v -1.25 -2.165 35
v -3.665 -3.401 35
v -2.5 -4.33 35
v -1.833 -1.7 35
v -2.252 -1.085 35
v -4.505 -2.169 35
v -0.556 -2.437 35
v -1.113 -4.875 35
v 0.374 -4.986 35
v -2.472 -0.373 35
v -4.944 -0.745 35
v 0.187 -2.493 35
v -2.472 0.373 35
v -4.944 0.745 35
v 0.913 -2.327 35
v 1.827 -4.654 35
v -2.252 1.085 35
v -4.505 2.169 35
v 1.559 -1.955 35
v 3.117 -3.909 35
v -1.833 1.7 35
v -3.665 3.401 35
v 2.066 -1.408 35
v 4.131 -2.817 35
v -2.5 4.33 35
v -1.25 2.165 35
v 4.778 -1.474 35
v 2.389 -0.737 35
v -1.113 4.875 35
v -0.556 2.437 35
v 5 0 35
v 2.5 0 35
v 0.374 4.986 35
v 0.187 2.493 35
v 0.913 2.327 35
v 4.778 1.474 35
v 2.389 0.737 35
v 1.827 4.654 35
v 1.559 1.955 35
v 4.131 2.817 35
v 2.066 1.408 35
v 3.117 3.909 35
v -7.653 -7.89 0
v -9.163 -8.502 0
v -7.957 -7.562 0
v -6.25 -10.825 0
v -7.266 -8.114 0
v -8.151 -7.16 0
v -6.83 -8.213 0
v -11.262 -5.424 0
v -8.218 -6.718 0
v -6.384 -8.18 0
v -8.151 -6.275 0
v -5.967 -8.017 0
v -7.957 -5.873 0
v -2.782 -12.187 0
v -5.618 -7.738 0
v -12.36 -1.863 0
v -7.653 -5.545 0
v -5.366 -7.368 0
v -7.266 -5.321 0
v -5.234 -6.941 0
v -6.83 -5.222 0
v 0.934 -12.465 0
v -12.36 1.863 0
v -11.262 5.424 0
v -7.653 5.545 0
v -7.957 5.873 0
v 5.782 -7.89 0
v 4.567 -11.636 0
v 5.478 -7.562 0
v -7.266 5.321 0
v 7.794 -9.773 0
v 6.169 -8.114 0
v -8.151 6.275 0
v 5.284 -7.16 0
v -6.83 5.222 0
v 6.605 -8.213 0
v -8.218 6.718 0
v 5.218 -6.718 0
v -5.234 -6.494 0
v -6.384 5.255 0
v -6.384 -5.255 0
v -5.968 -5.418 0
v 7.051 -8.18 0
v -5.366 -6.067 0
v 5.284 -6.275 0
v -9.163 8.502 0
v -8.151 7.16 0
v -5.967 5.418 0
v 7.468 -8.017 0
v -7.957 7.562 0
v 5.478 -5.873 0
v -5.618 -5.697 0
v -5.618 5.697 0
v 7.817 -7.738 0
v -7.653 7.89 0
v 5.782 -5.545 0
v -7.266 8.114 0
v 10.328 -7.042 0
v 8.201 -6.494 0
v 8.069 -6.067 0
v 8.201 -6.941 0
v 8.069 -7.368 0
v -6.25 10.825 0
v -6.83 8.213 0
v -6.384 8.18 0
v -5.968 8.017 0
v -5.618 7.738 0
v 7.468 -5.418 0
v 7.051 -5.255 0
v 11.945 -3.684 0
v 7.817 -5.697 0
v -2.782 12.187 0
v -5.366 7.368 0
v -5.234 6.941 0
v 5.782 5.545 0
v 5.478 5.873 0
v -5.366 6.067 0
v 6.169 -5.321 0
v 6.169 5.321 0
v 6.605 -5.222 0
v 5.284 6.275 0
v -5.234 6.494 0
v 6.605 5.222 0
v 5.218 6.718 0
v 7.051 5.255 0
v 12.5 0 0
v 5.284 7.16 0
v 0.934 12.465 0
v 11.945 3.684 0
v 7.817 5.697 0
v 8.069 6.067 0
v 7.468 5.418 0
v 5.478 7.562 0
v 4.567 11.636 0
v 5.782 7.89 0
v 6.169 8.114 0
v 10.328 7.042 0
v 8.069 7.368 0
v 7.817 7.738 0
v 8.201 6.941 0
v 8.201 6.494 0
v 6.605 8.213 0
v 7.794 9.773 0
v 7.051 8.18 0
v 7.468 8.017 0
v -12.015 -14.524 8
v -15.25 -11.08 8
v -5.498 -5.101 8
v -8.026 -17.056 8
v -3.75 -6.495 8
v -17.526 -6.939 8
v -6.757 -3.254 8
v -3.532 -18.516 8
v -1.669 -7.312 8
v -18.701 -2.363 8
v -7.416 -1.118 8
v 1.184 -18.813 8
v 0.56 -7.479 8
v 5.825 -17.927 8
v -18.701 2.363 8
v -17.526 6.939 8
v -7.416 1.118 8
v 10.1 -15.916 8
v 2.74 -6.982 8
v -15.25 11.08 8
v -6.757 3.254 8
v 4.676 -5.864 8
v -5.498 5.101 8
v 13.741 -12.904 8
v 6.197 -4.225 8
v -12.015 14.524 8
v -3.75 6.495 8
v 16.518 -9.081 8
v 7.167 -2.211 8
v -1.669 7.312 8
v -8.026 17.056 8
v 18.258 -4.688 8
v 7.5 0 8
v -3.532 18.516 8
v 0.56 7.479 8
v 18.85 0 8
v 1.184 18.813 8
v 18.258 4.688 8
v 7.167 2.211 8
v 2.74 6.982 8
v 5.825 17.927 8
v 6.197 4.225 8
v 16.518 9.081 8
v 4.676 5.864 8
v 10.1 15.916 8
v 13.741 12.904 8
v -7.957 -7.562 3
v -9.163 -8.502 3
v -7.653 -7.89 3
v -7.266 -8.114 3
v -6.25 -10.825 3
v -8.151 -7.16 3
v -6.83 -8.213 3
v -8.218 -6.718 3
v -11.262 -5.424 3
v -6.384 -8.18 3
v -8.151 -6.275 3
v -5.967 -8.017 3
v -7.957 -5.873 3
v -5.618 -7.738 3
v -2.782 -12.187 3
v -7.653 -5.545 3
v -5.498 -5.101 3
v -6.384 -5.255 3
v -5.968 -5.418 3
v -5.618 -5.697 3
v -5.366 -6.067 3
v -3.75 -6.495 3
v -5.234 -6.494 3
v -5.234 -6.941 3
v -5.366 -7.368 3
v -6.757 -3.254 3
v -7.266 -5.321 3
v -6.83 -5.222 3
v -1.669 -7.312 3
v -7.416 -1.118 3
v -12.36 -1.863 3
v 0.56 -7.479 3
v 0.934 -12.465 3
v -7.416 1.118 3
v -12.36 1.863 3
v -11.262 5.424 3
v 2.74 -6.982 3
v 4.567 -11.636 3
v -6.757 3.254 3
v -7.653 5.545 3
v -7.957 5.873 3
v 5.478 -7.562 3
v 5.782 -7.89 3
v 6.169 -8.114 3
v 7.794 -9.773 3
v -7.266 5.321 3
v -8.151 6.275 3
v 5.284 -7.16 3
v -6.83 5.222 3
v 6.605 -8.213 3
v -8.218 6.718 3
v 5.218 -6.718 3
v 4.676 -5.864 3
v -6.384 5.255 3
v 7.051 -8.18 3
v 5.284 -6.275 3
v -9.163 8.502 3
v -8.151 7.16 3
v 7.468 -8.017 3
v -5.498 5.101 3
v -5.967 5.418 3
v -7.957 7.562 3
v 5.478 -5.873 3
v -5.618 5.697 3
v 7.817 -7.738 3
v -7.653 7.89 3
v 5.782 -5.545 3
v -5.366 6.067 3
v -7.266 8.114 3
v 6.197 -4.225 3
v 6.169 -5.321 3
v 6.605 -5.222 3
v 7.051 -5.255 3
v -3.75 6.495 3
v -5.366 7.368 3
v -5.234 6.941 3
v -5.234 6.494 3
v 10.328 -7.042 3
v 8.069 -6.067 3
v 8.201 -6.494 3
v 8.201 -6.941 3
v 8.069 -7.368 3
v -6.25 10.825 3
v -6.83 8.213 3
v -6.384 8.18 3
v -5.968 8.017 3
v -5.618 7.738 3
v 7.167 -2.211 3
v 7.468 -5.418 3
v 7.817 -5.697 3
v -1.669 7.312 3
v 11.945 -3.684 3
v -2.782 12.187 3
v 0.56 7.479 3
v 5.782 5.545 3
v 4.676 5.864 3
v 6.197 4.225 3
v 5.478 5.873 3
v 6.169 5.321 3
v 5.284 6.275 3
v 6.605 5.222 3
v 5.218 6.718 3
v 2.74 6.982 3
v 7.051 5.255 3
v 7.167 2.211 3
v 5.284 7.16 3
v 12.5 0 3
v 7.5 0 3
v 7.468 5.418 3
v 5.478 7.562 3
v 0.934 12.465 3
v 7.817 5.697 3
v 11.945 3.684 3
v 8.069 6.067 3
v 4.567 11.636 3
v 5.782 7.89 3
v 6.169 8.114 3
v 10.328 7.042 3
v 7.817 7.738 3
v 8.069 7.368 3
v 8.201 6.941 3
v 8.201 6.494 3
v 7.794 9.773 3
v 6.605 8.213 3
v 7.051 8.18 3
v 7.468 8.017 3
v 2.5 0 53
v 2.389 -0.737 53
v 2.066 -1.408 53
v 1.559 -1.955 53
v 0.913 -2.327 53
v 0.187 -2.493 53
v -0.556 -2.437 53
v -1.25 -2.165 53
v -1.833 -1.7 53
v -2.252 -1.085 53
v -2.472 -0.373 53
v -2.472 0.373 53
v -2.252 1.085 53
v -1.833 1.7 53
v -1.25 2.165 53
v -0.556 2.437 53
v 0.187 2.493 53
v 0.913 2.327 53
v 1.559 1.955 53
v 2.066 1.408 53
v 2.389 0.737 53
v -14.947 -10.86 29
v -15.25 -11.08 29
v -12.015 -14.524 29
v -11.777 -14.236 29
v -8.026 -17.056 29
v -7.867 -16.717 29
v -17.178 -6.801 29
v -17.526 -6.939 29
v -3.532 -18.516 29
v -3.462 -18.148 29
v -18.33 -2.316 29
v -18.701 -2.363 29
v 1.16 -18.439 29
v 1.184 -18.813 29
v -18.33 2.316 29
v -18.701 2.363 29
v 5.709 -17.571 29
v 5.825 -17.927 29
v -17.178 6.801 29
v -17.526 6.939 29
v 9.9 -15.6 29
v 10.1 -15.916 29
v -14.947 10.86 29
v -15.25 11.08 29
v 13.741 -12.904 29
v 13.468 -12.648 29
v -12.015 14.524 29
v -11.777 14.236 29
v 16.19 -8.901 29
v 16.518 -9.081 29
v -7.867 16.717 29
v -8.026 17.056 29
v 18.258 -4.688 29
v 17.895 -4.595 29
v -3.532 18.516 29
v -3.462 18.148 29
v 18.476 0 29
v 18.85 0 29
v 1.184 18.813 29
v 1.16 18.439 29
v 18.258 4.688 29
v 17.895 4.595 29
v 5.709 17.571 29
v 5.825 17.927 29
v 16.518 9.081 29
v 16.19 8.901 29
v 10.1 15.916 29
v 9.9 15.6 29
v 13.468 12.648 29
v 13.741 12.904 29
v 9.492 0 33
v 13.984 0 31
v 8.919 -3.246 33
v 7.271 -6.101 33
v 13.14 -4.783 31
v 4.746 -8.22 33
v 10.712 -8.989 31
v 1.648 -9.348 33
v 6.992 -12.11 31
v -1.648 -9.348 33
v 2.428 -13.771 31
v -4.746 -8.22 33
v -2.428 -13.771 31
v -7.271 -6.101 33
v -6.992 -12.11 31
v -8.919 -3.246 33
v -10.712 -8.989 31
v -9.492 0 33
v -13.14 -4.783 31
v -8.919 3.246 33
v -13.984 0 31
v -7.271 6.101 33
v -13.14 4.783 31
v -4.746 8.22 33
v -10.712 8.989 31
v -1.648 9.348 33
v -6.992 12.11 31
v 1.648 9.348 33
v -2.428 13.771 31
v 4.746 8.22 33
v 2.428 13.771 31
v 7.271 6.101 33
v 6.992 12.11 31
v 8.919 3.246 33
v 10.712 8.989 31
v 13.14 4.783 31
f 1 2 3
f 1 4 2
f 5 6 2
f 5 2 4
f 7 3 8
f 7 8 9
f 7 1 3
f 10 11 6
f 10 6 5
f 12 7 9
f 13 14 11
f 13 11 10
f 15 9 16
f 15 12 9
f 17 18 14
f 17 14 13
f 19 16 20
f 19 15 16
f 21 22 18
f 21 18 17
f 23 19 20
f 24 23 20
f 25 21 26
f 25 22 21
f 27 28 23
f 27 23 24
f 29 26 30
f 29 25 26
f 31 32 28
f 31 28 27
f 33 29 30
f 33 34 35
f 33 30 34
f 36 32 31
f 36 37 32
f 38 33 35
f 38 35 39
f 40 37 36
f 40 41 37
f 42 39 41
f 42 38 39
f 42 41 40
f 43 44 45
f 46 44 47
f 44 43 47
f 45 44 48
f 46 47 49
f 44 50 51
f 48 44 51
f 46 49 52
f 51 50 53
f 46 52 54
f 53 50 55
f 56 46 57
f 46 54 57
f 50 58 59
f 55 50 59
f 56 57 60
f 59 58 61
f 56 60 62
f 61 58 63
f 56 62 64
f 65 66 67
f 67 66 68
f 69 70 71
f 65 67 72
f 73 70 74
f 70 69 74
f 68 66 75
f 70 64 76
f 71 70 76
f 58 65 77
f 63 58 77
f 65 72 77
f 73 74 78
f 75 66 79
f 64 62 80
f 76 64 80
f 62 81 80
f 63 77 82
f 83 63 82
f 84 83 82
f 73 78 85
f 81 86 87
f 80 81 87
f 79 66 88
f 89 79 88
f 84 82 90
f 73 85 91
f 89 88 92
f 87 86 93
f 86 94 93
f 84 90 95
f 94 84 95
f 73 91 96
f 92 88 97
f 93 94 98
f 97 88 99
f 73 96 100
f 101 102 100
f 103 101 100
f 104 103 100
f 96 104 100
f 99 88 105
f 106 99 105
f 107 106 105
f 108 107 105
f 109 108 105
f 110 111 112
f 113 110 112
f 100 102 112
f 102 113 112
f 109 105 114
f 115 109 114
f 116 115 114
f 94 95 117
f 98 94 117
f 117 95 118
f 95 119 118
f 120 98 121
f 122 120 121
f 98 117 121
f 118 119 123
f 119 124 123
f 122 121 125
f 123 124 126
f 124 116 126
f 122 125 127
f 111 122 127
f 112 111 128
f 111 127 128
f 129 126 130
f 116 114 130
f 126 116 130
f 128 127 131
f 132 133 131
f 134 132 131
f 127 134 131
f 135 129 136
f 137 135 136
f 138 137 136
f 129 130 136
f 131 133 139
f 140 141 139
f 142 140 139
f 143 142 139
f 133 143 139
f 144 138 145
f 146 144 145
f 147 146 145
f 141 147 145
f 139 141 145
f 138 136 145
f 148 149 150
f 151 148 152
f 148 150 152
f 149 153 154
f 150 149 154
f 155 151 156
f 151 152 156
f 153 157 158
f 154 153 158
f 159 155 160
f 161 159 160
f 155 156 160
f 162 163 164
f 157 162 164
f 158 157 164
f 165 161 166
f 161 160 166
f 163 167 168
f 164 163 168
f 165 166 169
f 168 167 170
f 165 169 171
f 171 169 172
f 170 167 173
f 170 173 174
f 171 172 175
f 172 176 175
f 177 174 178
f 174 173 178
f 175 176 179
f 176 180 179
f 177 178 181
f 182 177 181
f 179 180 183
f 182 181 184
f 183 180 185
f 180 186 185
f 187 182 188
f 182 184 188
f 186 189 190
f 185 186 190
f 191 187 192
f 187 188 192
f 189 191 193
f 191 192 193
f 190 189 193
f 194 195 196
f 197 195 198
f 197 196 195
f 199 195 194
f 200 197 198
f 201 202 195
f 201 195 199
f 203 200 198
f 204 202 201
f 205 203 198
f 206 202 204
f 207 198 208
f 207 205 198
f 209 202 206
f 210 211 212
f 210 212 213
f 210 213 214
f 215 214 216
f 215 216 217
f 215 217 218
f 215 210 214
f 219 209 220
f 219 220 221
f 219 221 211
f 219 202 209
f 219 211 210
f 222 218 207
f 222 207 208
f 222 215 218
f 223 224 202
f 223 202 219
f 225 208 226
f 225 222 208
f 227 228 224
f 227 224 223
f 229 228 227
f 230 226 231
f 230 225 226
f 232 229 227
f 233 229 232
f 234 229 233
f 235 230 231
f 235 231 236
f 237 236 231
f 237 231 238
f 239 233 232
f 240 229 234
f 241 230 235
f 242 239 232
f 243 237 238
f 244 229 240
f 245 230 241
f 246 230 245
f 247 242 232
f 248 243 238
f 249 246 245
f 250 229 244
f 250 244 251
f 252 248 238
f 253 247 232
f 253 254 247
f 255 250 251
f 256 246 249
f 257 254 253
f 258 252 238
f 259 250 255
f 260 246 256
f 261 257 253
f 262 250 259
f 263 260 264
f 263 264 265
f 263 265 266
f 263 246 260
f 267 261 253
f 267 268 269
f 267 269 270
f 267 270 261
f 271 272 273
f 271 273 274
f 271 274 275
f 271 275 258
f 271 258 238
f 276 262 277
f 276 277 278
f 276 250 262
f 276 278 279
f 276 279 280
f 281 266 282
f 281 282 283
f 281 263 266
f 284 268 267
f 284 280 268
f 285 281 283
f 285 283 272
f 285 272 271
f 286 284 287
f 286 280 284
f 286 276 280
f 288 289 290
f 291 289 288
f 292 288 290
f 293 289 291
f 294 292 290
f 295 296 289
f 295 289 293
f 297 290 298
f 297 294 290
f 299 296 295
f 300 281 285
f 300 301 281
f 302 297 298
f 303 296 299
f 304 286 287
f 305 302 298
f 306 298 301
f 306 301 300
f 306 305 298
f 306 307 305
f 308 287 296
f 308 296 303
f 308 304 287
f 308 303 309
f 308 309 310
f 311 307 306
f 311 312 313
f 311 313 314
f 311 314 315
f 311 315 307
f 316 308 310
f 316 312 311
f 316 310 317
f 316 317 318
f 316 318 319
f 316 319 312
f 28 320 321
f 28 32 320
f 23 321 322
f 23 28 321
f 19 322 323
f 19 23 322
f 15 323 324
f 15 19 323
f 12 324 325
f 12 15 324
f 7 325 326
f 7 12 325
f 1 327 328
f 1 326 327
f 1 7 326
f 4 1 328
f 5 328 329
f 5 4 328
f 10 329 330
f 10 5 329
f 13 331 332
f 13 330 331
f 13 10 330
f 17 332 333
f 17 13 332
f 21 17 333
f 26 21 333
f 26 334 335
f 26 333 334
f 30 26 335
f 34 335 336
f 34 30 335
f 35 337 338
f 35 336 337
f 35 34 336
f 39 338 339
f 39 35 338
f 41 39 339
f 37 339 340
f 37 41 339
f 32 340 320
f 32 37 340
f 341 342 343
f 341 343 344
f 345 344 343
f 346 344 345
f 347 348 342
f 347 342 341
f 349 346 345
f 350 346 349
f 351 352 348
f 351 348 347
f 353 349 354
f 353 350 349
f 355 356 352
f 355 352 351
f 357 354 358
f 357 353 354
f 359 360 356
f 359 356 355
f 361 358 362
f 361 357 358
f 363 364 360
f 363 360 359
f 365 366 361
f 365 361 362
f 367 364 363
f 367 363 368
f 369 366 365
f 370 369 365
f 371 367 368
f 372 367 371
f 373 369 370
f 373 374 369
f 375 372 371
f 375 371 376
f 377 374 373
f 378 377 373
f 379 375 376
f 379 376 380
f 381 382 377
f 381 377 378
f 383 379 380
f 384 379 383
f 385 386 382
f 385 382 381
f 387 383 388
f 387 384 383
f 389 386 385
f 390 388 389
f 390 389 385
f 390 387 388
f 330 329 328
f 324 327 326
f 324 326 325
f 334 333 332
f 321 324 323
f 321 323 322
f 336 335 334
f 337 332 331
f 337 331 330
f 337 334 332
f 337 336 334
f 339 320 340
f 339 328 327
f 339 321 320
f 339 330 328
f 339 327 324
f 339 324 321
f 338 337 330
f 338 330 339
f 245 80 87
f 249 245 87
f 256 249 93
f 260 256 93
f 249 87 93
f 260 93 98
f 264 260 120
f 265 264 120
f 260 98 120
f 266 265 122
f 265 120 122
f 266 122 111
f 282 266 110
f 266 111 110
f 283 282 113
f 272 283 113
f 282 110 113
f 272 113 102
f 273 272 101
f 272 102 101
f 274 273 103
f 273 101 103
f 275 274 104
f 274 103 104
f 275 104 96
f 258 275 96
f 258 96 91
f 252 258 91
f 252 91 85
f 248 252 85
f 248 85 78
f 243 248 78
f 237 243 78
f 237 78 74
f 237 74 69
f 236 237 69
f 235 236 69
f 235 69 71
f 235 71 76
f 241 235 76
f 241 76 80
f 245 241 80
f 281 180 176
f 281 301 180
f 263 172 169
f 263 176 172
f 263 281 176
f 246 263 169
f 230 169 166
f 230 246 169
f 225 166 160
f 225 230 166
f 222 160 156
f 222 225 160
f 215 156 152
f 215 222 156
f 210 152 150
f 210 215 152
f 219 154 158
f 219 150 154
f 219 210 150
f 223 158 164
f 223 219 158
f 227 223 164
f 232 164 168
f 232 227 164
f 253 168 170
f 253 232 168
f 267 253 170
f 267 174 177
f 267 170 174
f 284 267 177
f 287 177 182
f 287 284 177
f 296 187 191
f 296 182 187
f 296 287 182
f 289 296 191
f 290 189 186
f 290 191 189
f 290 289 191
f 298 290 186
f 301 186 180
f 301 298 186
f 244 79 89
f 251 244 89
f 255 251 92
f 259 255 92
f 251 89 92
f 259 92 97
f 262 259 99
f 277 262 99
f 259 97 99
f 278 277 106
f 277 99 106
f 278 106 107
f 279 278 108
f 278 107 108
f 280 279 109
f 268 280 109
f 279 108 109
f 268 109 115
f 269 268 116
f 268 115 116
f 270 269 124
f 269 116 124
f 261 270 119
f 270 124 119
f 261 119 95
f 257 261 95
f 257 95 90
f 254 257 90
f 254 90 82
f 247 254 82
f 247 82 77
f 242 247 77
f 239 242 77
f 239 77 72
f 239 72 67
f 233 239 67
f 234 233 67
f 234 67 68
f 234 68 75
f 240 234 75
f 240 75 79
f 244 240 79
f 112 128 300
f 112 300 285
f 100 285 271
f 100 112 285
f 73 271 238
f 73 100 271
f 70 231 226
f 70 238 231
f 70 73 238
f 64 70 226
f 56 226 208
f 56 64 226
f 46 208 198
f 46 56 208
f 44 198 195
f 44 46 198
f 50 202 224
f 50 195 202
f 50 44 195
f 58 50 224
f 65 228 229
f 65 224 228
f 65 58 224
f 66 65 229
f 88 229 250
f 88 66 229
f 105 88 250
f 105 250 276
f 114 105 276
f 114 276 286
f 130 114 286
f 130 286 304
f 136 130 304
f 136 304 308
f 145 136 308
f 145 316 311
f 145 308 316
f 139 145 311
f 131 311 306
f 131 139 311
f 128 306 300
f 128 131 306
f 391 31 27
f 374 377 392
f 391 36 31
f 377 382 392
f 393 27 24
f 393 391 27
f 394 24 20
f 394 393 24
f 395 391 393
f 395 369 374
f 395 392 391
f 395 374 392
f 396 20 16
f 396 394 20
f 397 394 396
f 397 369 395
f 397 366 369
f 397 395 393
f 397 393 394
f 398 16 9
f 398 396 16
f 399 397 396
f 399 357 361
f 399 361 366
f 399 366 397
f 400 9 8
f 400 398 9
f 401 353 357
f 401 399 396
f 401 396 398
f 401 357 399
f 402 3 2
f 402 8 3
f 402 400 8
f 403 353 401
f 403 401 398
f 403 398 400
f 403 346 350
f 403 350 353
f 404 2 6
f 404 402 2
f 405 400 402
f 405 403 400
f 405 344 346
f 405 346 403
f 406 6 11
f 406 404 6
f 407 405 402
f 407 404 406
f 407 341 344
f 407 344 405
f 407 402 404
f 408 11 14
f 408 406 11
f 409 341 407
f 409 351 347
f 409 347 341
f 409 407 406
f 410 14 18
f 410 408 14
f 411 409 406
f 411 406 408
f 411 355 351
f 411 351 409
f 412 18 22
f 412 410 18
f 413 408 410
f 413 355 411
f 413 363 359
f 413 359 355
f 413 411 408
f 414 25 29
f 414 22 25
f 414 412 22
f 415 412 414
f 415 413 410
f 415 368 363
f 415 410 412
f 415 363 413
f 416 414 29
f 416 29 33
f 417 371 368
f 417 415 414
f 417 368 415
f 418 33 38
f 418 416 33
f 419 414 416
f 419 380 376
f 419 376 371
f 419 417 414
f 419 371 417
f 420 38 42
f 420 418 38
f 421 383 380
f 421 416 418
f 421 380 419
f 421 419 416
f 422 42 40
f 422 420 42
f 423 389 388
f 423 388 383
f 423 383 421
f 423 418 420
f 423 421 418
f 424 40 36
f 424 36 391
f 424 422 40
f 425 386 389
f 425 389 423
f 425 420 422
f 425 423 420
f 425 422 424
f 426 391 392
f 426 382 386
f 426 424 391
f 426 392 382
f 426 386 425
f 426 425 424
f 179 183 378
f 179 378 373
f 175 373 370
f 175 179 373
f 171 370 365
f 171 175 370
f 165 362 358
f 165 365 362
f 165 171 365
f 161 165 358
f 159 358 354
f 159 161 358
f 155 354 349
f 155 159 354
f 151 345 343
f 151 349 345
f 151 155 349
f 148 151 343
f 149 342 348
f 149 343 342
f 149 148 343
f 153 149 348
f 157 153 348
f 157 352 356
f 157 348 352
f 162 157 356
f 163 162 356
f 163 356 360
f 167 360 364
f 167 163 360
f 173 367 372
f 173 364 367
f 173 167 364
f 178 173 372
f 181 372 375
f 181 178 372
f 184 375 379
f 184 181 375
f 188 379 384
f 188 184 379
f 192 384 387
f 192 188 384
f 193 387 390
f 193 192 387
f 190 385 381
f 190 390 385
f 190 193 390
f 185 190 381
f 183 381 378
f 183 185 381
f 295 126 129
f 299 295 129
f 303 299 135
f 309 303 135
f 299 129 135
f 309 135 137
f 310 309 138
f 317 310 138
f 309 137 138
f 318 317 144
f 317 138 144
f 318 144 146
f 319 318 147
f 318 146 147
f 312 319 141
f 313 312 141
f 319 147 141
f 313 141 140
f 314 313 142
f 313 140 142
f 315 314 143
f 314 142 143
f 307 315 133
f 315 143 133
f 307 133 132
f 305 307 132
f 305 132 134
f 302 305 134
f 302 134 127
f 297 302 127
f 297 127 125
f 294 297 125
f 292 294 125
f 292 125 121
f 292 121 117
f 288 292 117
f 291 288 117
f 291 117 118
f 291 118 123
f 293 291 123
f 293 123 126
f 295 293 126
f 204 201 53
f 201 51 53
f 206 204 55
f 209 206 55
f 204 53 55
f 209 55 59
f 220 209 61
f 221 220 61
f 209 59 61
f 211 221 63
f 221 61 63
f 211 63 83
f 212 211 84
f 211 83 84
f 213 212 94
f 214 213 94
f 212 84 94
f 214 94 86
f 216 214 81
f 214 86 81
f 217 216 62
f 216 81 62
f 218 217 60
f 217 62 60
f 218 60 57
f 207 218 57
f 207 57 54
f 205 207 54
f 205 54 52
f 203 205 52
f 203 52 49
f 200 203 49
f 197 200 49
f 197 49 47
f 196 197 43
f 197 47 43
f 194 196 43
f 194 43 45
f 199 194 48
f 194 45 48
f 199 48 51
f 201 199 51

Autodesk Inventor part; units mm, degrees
ref_plane "YZ Plane" through (0, 0, 0) normal (1, 0, 0) x (0, 1, 0)
ref_plane "XZ Plane" through (0, 0, 0) normal (0, 1, 0) x (-1, 0, 0)
ref_plane "XY Plane" through (0, 0, 0) normal (0, 0, 1) x (1, 0, 0)
sketch "Эскиз1" plane through (0, 0, 0) normal (0, 0, 1) x (1, 0, 0)
  circle A0 centre (0, 0) radius 12.5
  dimension "d0" = 25
extrude "Выдавливание1" add sketch "Эскиз1" along normal blind 3
sketch "Эскиз2" plane through (0, 0, 3) normal (0, 0, 1) x (1, 0, 0)
  circle A0 centre (0, 0) radius 7.5
  dimension "d3" = 15
extrude "Выдавливание2" add sketch "Эскиз2" along normal blind 5
sketch "Эскиз3" plane through (0, 0, 8) normal (0, 0, 1) x (1, 0, 0)
  circle A0 centre (0, 0) radius 18.85
  dimension "d6" = 37.7
extrude "Выдавливание3" add sketch "Эскиз3" along normal blind 21
sketch "Эскиз4" plane through (0, 0, 29) normal (0, 0, 1) x (1, 0, 0)
  circle A0 centre (0, 0) radius 5
  dimension "d9" = 10
extrude "Выдавливание4" add sketch "Эскиз4" along normal blind 6
chamfer "Фаска1" distance 6 angle 66 1 edges at (-5, 0, 29) measured on face at (4.9353, -0.8021, 33)
sketch "Эскиз5" plane through (0, 0, 35) normal (0, 0, 1) x (1, 0, 0)
  circle A0 centre (0, 0) radius 2.5
  dimension "d15" = 5
extrude "Выдавливание5" add sketch "Эскиз5" along normal blind 18
sketch "Эскиз6" plane through (0, 0, 0) normal (0, 0, -1) x (-1, 0, 0)
  circle A0 centre (0, 0) radius 9.5 construction
  circle A1 centre (0, 0) radius 12.5 construction
  line L0 (6.7175, -6.7175) -> (-6.7175, -6.7175) construction
  line L1 (-6.7175, -6.7175) -> (-6.7175, 6.7175) construction
  line L2 (-6.7175, 6.7175) -> (6.7175, 6.7175) construction
  line L3 (6.7175, 6.7175) -> (6.7175, -6.7175) construction
  line L4 (6.7175, -6.7175) -> (-6.7175, 6.7175) construction
  line L5 (-6.7175, -6.7175) -> (6.7175, 6.7175) construction
  circle A2 centre (6.7175, -6.7175) radius 1.5
  circle A3 centre (-6.7175, -6.7175) radius 1.5
  circle A4 centre (-6.7175, 6.7175) radius 1.5
  circle A5 centre (6.7175, 6.7175) radius 1.5
  dimension "d20" = 19
  dimension "d21" = 3
  dimension "d22" = 3
  dimension "d23" = 3
  dimension "d24" = 3
extrude "Выдавливание6" cut sketch "Эскиз6" against normal blind 5
properties part number "Двигатель 3115"
